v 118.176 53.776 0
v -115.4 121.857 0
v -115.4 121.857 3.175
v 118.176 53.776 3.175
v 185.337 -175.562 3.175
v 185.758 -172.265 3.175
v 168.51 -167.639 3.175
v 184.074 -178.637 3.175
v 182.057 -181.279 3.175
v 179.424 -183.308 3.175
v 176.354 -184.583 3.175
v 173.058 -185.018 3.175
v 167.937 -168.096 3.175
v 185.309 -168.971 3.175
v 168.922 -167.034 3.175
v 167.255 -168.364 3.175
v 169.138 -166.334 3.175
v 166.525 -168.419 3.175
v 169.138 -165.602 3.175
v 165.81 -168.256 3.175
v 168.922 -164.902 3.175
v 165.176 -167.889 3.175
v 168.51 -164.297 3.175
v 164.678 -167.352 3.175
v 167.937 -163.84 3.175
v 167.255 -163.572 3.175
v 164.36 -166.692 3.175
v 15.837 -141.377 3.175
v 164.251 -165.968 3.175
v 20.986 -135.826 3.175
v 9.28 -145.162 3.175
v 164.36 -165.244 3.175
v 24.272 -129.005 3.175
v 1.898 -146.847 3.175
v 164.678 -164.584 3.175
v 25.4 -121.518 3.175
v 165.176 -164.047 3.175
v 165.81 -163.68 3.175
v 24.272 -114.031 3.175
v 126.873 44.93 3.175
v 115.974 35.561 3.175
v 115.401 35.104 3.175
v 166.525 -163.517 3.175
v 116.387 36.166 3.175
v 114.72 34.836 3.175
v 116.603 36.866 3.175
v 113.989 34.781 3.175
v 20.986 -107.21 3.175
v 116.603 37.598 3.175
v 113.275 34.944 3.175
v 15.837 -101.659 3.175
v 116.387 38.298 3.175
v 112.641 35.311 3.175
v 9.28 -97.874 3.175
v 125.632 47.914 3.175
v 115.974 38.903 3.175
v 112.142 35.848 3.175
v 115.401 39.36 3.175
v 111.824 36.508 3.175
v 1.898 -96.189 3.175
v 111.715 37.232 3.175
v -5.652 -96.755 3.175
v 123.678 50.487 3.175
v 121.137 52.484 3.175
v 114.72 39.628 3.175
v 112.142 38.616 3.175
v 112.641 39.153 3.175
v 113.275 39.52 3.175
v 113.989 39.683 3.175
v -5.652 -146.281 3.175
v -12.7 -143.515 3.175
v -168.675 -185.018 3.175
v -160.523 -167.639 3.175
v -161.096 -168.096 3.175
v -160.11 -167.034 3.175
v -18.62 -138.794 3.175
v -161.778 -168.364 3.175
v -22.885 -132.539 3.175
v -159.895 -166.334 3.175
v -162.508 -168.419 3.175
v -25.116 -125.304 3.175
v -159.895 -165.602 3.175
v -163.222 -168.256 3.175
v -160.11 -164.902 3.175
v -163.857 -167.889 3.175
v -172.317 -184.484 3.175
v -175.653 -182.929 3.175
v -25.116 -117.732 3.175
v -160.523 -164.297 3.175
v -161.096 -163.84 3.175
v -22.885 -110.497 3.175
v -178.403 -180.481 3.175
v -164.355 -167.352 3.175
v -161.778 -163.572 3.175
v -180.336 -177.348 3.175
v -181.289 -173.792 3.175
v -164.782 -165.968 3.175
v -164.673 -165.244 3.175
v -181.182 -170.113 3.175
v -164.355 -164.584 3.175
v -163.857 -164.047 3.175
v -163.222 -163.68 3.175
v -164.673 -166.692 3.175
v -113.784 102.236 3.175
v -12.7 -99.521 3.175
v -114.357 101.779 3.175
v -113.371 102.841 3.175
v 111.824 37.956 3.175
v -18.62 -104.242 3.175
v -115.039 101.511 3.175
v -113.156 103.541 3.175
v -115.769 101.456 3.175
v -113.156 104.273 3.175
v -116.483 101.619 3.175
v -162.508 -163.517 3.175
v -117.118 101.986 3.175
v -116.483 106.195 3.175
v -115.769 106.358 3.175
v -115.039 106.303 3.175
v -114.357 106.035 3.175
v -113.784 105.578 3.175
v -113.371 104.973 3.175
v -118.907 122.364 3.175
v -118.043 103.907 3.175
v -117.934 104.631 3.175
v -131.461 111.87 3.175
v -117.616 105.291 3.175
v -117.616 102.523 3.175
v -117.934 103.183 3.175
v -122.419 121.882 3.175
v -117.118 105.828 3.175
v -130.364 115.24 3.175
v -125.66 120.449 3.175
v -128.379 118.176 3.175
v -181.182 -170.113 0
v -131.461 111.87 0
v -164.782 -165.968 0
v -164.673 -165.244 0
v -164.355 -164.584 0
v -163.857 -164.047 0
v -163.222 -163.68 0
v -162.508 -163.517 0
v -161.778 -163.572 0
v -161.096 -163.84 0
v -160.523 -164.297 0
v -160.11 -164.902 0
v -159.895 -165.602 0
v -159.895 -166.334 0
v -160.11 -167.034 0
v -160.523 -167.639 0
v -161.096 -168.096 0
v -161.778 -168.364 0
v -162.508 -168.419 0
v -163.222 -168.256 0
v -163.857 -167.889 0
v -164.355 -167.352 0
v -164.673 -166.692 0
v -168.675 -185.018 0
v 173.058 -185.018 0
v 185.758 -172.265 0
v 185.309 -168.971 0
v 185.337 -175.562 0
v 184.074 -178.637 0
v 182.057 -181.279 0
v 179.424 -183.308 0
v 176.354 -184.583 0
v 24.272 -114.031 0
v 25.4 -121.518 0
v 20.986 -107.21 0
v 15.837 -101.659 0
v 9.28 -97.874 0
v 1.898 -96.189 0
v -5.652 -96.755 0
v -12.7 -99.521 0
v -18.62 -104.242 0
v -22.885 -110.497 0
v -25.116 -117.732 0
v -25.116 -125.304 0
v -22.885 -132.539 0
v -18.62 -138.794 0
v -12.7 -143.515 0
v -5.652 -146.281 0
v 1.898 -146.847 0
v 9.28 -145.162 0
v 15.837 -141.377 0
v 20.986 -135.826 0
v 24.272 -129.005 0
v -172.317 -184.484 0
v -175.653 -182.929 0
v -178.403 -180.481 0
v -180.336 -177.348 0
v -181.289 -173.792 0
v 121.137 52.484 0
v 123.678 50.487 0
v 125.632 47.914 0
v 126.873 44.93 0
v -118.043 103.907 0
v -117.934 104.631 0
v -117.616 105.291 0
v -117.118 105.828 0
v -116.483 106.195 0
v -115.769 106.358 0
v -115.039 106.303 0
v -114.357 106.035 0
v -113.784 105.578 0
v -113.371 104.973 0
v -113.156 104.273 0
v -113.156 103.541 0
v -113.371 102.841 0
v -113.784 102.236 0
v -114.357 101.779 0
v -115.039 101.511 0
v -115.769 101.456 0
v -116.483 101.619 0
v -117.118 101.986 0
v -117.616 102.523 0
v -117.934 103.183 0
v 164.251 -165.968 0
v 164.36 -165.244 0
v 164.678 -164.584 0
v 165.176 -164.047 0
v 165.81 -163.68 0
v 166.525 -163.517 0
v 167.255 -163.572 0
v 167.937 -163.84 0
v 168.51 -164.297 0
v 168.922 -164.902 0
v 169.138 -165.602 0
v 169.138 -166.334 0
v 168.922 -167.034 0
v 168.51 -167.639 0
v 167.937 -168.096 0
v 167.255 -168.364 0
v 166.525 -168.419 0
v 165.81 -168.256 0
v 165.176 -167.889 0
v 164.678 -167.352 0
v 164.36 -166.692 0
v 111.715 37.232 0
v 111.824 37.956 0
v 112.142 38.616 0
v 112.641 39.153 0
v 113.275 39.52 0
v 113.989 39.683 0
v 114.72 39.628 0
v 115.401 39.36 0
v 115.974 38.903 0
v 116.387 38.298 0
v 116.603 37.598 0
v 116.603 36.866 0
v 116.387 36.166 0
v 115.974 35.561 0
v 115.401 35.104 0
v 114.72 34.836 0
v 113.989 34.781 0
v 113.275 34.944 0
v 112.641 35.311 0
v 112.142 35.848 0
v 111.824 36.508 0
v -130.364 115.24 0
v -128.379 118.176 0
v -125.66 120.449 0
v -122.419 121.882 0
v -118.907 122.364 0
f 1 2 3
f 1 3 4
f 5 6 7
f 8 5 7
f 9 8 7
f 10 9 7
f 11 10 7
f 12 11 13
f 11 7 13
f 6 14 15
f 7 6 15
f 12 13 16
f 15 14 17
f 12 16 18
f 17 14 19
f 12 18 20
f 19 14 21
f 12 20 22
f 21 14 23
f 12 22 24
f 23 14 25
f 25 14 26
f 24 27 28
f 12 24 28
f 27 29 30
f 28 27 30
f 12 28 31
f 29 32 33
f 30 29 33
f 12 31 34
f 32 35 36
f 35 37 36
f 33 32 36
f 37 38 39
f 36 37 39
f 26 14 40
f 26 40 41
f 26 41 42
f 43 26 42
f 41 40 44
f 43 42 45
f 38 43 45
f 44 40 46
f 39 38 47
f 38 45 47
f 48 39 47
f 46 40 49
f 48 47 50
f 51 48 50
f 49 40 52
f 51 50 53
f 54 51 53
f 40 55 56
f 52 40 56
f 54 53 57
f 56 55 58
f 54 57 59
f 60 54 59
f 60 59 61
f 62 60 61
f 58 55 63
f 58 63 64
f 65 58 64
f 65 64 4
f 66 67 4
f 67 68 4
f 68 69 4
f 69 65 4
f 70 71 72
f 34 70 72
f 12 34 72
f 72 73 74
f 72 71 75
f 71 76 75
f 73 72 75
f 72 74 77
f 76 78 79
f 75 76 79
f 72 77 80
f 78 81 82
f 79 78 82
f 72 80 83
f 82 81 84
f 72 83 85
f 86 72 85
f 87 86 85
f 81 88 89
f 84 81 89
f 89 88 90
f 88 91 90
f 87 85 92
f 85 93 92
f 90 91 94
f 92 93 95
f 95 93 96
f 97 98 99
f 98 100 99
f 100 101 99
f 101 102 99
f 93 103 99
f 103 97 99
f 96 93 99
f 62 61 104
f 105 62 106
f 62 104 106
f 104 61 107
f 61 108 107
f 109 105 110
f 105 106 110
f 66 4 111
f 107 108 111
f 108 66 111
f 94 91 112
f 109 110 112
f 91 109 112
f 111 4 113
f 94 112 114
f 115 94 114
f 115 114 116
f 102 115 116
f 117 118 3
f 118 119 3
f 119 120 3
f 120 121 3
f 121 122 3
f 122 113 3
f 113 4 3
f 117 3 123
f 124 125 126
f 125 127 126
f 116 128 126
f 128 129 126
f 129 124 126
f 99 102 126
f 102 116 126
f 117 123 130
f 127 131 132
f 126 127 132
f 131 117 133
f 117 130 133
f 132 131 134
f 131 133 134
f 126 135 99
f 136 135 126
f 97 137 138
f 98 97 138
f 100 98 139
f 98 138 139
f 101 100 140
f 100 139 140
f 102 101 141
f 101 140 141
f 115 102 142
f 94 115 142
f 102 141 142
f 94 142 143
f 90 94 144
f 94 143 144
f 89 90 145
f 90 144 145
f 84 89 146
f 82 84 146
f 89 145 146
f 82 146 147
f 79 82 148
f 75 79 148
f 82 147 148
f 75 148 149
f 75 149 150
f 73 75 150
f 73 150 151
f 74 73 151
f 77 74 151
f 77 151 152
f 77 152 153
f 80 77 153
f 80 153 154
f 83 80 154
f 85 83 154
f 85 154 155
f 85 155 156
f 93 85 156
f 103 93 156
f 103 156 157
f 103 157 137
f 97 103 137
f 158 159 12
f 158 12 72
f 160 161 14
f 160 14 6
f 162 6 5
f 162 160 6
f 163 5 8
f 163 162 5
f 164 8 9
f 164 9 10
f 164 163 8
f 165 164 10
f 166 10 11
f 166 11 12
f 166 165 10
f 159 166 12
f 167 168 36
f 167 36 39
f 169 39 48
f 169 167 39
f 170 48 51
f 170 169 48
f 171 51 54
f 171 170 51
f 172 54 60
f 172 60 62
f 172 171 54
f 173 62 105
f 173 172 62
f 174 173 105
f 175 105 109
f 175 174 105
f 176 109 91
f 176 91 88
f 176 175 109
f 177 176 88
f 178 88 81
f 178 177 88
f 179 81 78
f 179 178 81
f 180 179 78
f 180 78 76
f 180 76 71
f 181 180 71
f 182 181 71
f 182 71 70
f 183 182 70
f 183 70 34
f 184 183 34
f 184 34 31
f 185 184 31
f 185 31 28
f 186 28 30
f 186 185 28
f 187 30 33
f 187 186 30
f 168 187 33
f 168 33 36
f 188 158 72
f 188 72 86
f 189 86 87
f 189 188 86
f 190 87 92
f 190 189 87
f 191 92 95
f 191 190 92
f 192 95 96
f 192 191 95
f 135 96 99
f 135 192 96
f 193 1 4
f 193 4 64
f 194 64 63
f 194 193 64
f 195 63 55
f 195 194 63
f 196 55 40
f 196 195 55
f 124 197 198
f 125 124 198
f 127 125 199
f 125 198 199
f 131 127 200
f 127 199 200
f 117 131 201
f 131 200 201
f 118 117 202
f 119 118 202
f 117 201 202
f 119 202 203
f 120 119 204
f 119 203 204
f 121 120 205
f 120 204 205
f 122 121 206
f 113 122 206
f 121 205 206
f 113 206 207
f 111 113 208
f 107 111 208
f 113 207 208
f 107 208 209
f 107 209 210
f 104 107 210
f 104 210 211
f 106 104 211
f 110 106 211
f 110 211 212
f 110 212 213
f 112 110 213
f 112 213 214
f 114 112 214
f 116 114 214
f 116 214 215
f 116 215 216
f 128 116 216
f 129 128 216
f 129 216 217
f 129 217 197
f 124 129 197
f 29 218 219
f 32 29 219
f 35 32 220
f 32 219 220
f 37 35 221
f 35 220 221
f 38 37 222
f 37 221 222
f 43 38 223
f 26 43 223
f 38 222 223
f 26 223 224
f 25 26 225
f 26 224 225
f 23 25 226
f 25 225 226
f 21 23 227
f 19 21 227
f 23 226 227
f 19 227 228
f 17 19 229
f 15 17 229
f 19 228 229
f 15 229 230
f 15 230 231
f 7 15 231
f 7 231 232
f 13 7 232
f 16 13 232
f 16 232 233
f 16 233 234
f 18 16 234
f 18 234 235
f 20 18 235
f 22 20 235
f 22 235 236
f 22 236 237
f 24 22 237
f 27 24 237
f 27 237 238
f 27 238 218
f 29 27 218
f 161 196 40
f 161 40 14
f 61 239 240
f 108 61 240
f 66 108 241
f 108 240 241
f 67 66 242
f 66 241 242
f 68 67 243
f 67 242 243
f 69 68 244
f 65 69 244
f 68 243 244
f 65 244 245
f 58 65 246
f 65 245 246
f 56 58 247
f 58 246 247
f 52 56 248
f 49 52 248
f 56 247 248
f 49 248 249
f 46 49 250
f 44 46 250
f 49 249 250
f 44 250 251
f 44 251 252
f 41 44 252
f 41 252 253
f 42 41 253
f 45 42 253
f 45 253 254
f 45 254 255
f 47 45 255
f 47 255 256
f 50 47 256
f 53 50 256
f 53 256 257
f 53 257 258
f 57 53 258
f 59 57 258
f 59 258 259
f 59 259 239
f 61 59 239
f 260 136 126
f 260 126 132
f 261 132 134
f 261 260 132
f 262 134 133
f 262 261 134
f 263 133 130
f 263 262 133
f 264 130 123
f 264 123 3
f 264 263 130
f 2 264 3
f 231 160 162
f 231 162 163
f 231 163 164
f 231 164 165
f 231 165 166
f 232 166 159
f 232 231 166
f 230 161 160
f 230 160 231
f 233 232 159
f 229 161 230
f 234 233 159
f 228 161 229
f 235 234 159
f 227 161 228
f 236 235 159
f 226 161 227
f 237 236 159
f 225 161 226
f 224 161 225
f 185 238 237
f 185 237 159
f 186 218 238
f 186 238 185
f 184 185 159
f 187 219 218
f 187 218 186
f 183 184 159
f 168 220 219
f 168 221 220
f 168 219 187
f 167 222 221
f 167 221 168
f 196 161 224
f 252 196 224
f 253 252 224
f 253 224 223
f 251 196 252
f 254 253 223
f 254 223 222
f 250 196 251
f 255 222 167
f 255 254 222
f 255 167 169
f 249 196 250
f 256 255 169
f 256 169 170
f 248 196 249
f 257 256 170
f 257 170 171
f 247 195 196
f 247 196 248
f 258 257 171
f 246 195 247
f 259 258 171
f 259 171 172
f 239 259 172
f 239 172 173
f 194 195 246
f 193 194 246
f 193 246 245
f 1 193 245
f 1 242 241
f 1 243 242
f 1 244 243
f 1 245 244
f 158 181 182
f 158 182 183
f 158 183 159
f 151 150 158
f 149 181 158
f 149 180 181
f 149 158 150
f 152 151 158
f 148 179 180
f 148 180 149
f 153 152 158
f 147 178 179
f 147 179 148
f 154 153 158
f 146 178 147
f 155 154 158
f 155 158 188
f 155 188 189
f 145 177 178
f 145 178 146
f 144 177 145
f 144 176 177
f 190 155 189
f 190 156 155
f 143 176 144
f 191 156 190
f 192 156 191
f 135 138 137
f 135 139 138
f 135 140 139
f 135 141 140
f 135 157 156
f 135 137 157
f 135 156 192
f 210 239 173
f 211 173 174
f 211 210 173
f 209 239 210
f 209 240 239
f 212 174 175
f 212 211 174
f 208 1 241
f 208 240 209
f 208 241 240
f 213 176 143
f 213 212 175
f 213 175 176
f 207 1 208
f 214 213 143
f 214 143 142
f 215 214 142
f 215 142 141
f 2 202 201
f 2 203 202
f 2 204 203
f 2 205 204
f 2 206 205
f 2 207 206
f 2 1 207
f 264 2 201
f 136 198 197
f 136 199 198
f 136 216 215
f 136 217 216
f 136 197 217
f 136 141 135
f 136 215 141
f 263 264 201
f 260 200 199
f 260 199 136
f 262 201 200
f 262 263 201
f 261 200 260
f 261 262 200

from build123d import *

# Parameters (mm, degrees)
SKETCH1_R                    = 25.4
BOSS_EXTRUDE1_DEPTH          = 3.175
F_10_0_1935_DIAMETER_HOLE1_D = 4.9149


with BuildPart() as part:
    # Sketch1 → Boss-Extrude1 (new body)
    with BuildSketch(Plane.XY):
        with BuildLine():
            Line((-115.39963726, 121.856862886), (118.175506769, 53.775916926))
            ThreePointArc((118.175506769, 53.775916926), (123.677628265, 50.487202579), (126.872726544, 44.930195291))
            Line((126.872726544, 44.930195291), (185.309252431, -168.971096981))
            ThreePointArc((185.309252431, -168.971096981), (183.152652559, -180.024636286), (173.058204177, -185.018008497))
            Line((173.058204177, -185.018008497), (-168.674542419, -185.018008497))
            ThreePointArc((-168.674542419, -185.018008497), (-178.403306847, -180.48141114), (-181.181600882, -170.112676641))
            Line((-181.181600882, -170.112676641), (-131.460524201, 111.869561592))
            ThreePointArc((-131.460524201, 111.869561592), (-125.659927441, 120.449097441), (-115.39963726, 121.856862886))
        make_face()
        with Locations((0, -121.518008497)):
            Circle(SKETCH1_R, mode=Mode.SUBTRACT)
    extrude(amount=BOSS_EXTRUDE1_DEPTH)

    # #10 (0.1935) Diameter Hole1 (through all)
    with Locations(Plane.XY.offset(3.175)):
        with Locations((-115.585524201, 103.906991503), (114.172726544, 37.231991503), (166.708204177, -165.968008497), (-162.324542419, -165.968008497)):
            Hole(F_10_0_1935_DIAMETER_HOLE1_D / 2)


solid = part.part
